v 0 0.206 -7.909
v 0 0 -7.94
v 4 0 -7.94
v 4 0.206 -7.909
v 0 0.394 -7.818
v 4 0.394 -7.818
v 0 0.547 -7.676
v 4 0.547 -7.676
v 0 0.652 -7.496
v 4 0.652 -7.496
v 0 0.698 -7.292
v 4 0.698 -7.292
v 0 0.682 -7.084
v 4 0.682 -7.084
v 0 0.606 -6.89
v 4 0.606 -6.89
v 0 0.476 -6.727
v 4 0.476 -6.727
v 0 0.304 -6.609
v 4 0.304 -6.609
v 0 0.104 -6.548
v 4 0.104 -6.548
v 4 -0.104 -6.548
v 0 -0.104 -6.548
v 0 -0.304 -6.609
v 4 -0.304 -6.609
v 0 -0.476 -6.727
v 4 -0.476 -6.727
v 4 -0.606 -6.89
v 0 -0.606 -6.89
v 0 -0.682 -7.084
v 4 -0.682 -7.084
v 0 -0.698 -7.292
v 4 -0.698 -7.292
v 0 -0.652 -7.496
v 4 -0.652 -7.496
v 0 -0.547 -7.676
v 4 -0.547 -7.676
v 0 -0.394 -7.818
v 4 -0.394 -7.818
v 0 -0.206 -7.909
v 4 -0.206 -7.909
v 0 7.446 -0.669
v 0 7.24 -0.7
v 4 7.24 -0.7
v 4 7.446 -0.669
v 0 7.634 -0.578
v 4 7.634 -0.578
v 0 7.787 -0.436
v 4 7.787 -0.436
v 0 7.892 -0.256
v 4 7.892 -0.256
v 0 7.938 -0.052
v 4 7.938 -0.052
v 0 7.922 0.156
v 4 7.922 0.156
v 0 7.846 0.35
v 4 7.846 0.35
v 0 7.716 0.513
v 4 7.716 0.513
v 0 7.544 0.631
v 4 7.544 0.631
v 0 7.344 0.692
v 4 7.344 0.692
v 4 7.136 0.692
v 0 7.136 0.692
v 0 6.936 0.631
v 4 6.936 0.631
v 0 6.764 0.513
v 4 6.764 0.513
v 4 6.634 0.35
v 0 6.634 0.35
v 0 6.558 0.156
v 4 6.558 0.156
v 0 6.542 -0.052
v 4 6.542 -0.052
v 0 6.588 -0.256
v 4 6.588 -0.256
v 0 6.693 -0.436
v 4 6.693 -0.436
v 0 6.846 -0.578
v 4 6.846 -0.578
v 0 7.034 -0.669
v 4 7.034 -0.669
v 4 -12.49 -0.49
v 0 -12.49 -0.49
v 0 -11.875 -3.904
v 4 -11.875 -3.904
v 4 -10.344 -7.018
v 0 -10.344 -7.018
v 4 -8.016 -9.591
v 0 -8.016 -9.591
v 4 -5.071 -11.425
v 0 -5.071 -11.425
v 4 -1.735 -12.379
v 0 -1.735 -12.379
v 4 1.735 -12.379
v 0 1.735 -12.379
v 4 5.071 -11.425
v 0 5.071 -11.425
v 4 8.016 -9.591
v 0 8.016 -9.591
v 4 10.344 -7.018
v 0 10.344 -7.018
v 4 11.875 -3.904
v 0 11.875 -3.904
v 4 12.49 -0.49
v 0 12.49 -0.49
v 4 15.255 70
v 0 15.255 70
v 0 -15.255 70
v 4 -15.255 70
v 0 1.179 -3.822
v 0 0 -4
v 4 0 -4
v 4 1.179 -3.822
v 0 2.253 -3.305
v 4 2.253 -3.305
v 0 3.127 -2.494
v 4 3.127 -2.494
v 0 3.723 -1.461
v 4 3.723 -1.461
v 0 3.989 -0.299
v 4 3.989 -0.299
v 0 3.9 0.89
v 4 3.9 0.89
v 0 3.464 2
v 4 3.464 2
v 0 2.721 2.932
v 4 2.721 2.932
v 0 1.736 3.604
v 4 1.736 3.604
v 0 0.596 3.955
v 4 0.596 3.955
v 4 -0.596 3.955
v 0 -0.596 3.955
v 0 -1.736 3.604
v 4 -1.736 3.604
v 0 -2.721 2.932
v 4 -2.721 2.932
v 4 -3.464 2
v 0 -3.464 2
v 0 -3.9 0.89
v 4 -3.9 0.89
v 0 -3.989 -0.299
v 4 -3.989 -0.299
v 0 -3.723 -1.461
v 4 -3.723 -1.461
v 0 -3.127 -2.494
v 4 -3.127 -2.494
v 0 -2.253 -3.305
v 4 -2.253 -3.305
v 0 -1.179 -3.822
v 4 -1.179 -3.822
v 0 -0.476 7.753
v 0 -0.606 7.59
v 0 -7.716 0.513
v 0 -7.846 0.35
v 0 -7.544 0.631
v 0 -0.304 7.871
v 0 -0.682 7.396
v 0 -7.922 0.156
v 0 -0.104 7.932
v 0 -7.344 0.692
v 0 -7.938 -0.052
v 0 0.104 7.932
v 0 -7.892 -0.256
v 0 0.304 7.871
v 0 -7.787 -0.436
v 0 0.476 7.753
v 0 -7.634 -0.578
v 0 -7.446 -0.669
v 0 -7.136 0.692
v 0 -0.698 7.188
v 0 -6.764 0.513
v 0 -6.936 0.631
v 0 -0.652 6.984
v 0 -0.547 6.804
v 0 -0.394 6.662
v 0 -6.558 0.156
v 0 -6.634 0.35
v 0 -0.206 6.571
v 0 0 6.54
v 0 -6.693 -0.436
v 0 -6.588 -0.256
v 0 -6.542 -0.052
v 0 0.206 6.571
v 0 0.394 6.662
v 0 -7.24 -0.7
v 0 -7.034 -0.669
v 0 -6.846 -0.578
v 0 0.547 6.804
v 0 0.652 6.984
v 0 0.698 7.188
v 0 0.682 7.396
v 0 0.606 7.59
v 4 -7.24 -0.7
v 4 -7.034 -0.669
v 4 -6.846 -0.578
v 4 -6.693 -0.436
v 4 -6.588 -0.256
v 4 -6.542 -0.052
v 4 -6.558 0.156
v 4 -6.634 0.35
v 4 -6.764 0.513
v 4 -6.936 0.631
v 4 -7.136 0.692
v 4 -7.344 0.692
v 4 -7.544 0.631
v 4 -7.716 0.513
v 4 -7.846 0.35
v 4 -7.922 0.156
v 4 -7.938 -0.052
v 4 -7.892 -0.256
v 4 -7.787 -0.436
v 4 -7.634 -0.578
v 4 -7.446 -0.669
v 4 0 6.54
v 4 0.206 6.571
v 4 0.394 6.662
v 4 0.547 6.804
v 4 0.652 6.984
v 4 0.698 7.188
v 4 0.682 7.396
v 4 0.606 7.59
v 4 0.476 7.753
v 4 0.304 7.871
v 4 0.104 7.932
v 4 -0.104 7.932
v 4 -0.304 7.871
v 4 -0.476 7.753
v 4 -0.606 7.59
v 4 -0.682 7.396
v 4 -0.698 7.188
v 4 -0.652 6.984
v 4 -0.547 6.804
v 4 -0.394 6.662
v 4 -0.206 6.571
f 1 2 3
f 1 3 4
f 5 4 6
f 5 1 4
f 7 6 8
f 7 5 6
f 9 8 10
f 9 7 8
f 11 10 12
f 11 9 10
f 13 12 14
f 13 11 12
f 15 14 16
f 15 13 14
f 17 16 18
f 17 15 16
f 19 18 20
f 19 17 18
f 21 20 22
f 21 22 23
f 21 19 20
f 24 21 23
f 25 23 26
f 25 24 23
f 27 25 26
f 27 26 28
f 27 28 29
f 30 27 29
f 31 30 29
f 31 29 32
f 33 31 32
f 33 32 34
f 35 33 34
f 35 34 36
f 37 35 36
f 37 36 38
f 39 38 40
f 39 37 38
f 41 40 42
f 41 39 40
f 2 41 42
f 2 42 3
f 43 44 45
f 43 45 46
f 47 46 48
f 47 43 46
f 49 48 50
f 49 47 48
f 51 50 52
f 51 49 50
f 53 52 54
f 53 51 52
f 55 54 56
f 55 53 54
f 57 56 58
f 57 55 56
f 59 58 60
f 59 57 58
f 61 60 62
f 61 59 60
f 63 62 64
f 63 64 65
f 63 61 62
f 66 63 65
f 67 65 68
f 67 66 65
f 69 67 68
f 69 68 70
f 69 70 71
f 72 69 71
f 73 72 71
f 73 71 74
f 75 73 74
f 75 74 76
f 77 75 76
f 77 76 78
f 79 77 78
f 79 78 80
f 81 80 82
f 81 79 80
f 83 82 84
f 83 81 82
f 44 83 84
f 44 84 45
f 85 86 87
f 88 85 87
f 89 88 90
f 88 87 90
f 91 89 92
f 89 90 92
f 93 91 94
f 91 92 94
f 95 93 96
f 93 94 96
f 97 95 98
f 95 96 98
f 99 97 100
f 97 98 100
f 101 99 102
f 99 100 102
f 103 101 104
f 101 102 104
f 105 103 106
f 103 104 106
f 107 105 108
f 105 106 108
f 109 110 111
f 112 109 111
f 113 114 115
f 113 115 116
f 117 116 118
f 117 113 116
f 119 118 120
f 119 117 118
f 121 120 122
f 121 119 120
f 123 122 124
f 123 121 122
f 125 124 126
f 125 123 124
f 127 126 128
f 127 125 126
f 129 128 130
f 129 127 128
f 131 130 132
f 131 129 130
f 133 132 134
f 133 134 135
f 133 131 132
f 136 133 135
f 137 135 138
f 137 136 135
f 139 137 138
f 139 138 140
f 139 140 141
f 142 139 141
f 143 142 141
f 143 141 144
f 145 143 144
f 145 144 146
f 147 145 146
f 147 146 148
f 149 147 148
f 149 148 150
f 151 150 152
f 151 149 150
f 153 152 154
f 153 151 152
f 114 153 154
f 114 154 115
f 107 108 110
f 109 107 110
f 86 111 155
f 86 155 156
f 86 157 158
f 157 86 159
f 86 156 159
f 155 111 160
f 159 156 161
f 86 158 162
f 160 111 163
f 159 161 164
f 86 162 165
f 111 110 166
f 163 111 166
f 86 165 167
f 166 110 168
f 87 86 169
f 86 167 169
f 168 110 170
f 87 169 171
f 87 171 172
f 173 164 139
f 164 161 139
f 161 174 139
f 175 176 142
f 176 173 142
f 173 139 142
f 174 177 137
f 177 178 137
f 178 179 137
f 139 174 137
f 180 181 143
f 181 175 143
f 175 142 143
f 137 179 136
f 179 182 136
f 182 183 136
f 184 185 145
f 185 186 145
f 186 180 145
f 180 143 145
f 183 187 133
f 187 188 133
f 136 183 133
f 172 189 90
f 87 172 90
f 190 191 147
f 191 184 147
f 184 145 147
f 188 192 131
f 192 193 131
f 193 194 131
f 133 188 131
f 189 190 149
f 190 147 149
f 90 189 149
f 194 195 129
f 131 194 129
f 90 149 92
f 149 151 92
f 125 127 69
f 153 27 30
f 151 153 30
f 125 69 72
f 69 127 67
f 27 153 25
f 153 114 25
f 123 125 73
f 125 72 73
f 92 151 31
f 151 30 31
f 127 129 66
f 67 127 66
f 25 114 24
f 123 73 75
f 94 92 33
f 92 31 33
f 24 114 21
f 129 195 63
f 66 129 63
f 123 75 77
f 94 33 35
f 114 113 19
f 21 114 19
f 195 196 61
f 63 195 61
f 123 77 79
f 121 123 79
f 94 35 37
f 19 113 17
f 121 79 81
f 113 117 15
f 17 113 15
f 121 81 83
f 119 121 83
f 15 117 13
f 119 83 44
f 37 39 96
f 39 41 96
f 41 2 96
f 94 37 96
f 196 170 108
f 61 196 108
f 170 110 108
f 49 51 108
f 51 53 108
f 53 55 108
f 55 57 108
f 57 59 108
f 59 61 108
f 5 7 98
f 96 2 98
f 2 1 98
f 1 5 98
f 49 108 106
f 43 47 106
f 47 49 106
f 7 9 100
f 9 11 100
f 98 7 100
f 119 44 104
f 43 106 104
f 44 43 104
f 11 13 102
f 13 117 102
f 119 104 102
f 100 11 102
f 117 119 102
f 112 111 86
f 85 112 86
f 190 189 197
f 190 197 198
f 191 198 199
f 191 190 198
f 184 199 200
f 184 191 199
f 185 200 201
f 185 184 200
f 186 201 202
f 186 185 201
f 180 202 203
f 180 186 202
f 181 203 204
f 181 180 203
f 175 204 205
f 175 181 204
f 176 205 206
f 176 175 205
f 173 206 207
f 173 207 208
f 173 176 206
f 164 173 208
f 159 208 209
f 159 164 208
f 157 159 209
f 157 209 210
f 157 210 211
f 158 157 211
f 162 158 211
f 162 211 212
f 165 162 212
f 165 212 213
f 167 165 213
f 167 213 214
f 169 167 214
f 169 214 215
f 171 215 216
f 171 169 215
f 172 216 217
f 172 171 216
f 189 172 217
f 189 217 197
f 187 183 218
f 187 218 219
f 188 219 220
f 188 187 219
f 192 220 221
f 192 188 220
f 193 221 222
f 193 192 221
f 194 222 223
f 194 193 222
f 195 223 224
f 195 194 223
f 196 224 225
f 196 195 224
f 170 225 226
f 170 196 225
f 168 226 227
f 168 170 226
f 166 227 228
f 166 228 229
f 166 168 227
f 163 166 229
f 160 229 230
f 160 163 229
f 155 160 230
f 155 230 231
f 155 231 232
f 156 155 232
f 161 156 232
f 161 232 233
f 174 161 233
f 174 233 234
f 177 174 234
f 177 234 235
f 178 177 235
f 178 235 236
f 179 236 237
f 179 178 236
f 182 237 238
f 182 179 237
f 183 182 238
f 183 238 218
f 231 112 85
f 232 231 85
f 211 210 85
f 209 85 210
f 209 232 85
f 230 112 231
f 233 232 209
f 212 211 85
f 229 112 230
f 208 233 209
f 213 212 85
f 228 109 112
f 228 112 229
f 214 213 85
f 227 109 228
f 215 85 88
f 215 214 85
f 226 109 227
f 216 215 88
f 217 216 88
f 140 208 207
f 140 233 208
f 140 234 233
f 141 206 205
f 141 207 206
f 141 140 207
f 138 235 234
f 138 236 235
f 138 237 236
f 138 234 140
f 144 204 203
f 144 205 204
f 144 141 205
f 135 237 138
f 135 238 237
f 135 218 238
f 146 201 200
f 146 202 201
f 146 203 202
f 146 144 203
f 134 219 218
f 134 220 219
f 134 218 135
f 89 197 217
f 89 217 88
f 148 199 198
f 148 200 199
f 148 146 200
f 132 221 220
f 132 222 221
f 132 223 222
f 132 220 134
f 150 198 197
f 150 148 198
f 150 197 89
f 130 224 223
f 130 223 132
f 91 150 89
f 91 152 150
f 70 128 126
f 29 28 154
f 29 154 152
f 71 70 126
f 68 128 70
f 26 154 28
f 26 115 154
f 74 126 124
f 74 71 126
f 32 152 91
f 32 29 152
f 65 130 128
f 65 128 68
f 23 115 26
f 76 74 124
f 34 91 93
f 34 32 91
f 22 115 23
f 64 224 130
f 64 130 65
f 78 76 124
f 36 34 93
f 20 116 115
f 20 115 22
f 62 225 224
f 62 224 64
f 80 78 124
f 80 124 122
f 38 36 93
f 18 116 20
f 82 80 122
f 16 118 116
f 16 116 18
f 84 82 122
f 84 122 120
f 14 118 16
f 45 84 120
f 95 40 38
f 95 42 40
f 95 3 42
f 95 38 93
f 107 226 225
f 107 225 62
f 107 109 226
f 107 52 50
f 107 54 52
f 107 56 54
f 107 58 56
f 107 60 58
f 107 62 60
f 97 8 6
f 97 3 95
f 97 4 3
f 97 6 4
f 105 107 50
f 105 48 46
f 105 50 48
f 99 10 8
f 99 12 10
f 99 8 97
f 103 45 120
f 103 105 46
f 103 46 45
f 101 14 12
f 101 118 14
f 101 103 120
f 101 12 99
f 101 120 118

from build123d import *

# Parameters (mm, degrees)
SKETCH1_R           = 4
SKETCH1_R_2         = 0.7
BOSS_EXTRUDE1_DEPTH = 4


with BuildPart() as part:
    # Sketch1 → Boss-Extrude1 (new body)
    with BuildSketch(Plane(origin=(0, 0, 0), x_dir=(0, 0, -1), z_dir=(1, 0, 0))):
        with BuildLine():
            Line((-70, 15.254804339), (-70, -15.254804339))
            Line((-70, -15.254804339), (0.489836976, -12.490398702))
            ThreePointArc((0.489836976, -12.490398702), (12.5, 0), (0.489836976, 12.490398702))
            Line((0.489836976, 12.490398702), (-70, 15.254804339))
        make_face()
        Circle(SKETCH1_R, mode=Mode.SUBTRACT)
        with Locations((-7.24, 0)):
            Circle(SKETCH1_R_2, mode=Mode.SUBTRACT)
        with Locations((0, 7.24)):
            Circle(SKETCH1_R_2, mode=Mode.SUBTRACT)
        with Locations((7.24, 0)):
            Circle(SKETCH1_R_2, mode=Mode.SUBTRACT)
        with Locations((0, -7.24)):
            Circle(SKETCH1_R_2, mode=Mode.SUBTRACT)
    extrude(amount=BOSS_EXTRUDE1_DEPTH)


solid = part.part
